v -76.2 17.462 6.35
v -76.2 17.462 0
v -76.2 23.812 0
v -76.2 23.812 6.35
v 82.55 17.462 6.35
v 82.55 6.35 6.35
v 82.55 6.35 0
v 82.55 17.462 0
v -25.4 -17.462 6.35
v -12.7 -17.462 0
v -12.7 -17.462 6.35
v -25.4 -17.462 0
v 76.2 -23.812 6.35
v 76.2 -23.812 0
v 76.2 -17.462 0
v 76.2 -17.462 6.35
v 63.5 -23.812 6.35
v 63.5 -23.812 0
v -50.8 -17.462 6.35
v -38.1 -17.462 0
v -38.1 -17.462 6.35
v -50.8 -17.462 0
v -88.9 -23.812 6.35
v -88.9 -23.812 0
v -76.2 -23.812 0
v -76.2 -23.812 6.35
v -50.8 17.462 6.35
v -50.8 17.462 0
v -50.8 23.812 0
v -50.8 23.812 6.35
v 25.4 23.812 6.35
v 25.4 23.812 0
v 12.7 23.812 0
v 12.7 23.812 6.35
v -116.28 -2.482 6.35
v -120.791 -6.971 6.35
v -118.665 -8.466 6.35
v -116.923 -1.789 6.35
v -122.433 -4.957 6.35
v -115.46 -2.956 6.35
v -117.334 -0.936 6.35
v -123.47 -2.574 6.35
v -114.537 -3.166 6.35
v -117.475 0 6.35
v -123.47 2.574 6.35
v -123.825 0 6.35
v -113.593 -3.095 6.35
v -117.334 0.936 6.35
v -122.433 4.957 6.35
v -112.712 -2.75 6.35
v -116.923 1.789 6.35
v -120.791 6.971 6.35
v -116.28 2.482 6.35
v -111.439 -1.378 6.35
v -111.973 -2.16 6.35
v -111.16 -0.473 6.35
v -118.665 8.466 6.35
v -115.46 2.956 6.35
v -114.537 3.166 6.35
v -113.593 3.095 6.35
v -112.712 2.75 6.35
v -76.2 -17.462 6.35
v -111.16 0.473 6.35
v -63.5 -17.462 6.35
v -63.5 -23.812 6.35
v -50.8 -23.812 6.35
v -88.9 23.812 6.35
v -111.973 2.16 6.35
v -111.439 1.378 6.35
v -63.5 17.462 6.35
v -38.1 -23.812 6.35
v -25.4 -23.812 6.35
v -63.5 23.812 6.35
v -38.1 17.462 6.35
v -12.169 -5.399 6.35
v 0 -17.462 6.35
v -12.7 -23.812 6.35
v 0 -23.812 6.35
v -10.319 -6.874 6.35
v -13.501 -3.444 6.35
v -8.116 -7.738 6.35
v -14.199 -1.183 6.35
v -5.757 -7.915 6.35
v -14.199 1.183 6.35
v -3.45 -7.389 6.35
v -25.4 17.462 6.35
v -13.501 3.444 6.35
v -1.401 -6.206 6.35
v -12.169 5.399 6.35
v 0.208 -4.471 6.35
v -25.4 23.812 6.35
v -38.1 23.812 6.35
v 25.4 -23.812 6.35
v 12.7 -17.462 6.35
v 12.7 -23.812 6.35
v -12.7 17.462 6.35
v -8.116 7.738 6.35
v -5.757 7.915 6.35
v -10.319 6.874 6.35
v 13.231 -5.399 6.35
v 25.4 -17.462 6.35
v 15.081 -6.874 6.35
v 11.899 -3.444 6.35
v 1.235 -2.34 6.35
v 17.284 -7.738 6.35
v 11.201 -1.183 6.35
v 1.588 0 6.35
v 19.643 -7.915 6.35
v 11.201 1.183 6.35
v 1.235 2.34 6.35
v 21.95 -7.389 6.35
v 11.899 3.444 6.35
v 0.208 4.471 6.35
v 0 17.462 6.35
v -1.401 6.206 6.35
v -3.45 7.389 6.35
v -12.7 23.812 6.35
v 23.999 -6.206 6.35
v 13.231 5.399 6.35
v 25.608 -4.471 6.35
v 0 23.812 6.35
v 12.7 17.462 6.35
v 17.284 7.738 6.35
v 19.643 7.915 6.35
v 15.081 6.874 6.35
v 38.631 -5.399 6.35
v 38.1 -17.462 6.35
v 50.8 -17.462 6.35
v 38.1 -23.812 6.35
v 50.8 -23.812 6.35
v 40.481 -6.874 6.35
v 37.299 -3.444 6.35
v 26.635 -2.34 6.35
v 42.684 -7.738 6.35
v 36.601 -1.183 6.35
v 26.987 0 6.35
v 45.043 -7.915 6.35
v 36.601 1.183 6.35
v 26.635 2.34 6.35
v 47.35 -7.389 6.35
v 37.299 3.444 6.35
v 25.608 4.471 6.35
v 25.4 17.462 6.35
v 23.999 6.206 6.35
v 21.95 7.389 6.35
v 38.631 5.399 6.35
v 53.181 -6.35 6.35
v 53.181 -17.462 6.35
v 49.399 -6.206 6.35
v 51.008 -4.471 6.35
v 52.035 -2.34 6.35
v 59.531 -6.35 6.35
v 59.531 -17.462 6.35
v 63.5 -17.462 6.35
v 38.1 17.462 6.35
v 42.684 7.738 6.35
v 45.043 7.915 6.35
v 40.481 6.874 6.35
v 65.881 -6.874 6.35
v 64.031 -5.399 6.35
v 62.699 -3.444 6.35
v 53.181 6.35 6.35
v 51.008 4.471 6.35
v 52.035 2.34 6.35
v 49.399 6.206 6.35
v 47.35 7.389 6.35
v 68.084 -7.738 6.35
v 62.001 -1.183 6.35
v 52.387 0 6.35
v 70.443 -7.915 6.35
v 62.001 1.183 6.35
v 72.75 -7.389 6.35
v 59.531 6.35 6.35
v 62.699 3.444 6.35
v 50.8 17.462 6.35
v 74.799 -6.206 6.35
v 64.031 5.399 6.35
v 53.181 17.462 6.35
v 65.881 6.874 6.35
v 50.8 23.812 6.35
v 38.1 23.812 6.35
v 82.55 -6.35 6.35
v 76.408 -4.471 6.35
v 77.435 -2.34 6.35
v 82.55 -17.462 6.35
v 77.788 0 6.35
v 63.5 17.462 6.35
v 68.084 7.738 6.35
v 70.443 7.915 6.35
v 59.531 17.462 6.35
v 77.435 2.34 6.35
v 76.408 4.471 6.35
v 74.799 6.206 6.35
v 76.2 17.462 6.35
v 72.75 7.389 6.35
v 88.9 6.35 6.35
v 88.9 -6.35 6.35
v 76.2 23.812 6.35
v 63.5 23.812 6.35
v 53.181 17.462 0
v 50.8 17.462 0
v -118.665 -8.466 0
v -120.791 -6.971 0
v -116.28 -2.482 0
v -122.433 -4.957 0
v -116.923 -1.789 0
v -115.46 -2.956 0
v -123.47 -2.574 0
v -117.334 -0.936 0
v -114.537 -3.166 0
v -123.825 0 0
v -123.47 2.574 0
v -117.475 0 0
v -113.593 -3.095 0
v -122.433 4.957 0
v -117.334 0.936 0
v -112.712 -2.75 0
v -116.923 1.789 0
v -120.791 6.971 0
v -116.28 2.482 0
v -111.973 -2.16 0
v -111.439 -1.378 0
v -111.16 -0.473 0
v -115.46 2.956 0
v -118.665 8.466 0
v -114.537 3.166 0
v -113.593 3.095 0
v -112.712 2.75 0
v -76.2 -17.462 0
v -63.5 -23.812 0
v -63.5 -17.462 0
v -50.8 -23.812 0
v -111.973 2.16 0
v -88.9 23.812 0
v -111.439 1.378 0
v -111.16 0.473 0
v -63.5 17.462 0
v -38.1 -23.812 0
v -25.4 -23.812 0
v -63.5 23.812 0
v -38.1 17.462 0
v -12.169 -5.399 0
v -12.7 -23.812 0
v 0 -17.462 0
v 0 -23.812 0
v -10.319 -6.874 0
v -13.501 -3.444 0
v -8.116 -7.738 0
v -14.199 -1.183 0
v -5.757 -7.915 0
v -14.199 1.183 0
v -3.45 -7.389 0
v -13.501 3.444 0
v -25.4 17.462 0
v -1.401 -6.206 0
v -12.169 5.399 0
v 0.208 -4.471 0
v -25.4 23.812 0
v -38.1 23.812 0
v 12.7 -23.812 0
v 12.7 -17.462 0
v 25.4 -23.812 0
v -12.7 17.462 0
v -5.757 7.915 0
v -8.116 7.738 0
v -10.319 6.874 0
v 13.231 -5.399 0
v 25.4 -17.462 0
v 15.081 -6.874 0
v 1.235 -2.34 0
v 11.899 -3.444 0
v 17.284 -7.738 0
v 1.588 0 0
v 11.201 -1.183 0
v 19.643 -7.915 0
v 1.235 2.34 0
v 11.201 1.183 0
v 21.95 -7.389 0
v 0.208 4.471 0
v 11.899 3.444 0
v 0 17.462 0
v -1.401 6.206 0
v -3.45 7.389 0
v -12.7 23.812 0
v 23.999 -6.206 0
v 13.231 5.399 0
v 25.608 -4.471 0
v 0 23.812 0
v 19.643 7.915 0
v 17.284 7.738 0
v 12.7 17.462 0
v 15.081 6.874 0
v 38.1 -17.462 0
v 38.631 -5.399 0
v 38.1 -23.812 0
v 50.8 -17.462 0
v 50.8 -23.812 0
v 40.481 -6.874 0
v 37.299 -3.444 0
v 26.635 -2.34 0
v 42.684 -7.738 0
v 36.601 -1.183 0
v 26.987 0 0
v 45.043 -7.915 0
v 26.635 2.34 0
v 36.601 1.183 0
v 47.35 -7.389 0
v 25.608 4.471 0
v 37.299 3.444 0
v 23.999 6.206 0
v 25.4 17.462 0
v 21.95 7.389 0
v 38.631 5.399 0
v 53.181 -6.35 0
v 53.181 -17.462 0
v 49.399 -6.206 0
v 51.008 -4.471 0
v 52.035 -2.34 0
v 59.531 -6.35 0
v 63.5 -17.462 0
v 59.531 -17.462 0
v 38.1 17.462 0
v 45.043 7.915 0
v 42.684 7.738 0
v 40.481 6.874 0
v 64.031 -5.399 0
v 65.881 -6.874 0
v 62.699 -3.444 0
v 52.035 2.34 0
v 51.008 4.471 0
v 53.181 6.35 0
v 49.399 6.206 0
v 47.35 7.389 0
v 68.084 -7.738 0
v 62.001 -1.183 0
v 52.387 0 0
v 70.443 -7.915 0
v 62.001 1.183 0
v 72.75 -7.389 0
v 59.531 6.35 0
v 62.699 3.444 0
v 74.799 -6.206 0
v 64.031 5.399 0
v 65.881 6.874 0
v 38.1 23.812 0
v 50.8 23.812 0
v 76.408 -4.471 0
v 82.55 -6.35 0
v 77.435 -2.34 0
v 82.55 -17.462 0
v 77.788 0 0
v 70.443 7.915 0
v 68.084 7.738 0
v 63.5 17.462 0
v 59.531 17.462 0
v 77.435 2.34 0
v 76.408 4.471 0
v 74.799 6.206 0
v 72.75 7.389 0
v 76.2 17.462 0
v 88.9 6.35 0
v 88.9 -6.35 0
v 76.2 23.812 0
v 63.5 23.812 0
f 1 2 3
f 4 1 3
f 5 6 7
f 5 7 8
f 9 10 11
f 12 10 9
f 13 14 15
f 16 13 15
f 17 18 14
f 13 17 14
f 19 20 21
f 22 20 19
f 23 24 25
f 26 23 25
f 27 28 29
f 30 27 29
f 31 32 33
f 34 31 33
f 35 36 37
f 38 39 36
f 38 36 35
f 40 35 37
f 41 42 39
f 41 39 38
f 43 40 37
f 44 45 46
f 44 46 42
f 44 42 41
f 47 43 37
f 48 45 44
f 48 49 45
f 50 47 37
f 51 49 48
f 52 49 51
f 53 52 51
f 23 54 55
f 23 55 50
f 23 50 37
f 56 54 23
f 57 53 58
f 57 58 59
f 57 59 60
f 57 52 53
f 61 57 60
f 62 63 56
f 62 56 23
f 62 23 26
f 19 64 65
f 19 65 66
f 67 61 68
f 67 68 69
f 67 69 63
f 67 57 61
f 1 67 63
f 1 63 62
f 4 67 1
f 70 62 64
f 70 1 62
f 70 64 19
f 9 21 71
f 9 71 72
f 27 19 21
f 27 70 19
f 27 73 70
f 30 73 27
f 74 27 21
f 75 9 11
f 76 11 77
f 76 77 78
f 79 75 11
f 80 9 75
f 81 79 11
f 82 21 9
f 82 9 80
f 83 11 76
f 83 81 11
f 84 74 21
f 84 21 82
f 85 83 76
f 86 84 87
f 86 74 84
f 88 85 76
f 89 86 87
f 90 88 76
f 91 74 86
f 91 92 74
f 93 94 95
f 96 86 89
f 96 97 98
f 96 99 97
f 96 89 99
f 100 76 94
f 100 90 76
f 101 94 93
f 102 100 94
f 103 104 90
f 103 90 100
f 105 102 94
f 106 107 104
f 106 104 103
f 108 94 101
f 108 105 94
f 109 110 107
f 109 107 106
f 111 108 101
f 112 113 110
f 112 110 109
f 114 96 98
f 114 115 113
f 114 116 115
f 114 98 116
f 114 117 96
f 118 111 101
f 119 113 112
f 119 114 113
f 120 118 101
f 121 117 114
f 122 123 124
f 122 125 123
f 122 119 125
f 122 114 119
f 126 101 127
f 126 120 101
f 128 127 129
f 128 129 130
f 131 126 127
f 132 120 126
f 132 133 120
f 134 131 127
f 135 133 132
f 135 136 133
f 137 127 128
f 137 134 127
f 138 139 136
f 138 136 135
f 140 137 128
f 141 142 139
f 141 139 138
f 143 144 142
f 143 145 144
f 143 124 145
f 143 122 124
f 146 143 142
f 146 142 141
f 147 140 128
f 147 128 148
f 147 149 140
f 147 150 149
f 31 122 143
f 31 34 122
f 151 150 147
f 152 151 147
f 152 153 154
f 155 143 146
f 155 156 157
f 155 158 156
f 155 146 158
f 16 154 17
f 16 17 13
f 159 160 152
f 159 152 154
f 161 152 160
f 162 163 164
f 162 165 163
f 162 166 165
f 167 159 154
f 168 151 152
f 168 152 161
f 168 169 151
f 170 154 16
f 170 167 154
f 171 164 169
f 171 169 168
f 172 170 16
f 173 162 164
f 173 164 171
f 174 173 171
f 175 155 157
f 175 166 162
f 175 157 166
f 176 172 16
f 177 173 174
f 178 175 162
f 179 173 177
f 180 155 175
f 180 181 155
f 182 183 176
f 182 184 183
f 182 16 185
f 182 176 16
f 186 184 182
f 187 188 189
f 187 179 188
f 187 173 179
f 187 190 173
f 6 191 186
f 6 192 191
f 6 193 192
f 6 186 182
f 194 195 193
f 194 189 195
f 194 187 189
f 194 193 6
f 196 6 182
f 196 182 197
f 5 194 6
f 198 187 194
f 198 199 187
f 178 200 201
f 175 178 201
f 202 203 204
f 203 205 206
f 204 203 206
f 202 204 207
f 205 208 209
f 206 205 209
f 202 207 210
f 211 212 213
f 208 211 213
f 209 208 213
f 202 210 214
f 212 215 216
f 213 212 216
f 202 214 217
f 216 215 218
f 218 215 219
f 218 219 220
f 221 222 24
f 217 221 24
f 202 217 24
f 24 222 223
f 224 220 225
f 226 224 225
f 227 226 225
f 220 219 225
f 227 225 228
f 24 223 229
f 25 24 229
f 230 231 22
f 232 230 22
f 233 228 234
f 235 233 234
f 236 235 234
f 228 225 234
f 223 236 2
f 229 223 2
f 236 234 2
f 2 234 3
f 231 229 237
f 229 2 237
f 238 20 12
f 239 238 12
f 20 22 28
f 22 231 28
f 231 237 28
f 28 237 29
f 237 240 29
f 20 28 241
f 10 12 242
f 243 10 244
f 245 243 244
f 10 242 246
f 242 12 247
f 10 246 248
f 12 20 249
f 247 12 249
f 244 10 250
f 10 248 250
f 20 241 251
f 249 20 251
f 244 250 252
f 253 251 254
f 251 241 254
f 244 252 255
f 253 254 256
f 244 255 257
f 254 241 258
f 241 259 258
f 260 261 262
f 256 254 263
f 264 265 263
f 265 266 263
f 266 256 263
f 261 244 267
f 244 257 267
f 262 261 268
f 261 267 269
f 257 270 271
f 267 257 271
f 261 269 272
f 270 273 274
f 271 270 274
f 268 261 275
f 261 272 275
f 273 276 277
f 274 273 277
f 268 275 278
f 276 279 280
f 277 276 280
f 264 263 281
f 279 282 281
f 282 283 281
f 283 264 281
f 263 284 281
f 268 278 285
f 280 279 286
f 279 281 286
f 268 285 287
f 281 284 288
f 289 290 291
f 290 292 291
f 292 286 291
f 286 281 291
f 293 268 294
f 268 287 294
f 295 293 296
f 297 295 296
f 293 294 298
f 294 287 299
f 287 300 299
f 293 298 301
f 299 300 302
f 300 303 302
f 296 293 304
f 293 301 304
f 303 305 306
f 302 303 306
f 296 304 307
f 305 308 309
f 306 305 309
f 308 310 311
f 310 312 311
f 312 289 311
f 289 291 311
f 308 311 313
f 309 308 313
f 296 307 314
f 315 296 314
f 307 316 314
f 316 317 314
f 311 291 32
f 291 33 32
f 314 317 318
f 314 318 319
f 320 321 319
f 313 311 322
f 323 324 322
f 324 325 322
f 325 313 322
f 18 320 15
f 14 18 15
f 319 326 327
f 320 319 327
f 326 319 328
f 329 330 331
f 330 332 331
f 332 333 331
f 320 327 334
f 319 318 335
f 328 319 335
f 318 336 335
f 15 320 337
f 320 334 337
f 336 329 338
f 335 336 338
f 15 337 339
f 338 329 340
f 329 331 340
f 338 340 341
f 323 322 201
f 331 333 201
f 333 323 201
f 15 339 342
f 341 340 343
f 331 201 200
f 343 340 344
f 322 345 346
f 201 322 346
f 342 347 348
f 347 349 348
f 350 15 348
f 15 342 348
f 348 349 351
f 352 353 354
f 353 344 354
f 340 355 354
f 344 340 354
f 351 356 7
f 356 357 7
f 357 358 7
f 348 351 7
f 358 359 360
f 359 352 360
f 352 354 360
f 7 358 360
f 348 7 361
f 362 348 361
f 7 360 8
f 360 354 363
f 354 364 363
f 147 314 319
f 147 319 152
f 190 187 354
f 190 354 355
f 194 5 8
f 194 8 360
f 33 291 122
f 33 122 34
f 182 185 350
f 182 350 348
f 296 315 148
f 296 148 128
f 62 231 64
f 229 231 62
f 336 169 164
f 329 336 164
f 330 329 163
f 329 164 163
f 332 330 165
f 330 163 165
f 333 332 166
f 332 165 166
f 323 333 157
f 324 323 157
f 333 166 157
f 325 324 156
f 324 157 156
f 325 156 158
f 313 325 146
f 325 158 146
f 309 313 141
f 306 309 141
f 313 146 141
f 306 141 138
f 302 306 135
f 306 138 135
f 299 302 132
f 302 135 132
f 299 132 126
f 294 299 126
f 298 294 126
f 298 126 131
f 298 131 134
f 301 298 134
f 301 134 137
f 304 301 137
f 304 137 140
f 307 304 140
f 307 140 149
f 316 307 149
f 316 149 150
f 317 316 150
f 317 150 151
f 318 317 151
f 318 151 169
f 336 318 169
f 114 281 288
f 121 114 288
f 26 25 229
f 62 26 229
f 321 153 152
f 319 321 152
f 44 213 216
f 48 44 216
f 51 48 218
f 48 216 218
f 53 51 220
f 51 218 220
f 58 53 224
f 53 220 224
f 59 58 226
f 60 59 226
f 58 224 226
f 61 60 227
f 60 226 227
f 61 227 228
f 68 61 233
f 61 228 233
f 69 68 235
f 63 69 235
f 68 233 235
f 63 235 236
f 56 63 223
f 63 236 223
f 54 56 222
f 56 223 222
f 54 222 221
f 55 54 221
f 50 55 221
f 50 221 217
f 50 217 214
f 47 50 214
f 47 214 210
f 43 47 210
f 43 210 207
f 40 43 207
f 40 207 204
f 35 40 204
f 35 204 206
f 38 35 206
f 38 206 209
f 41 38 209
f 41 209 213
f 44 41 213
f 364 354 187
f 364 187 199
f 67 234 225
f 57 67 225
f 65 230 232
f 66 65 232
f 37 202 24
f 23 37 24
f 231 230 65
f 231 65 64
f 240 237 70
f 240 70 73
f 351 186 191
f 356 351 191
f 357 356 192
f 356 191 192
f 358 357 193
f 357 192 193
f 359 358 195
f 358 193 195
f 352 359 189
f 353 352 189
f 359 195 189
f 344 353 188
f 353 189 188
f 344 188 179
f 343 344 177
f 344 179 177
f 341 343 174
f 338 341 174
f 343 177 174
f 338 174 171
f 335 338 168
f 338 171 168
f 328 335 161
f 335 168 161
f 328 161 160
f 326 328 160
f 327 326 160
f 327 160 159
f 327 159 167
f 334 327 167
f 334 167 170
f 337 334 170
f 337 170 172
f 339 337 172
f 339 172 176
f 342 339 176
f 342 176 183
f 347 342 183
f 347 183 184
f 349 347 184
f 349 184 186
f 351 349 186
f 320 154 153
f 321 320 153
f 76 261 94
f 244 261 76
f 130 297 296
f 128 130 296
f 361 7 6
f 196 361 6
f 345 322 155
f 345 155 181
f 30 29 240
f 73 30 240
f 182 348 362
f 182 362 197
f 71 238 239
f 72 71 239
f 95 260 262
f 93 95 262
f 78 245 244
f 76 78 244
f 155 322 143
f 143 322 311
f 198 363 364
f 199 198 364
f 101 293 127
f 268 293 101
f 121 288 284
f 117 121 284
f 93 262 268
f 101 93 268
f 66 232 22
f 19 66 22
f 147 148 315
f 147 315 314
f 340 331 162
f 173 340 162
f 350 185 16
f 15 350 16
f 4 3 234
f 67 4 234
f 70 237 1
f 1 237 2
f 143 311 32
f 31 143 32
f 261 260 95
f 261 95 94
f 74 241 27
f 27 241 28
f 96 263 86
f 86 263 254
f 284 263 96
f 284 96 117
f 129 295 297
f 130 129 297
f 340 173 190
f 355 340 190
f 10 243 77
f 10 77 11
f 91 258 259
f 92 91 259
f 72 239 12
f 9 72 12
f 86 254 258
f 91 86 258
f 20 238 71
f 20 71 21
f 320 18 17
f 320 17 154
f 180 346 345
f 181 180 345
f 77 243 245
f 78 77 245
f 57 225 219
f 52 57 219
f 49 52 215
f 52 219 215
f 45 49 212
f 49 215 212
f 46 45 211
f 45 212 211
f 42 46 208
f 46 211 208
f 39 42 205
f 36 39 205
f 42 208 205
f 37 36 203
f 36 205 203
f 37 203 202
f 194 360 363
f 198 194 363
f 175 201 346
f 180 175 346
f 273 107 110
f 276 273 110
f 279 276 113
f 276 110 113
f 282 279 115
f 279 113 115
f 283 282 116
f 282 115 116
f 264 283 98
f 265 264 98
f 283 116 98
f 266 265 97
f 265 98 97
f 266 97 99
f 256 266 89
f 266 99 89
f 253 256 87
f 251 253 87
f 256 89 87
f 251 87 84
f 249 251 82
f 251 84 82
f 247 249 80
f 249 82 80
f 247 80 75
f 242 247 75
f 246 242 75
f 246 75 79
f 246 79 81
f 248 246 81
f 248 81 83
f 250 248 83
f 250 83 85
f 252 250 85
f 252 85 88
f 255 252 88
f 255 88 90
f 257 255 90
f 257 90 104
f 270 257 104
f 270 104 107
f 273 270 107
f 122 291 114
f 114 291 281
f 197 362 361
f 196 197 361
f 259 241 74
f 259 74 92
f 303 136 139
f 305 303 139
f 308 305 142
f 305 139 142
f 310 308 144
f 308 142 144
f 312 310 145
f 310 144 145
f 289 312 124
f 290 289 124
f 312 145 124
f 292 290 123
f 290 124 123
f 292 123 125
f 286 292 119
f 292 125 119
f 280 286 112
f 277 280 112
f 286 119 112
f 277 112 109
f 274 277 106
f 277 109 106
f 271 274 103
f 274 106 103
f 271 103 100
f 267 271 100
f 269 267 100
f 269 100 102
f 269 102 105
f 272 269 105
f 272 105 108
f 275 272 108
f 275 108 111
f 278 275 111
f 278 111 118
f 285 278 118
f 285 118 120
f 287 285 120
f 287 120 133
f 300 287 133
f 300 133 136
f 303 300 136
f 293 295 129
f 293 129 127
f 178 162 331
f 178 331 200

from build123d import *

# Parameters (mm, degrees)
MASS_DEPTH          = 6.35
SKETCH4_R           = 3.175
CUT_EXTRUDE1_DEPTH  = 127.253666407
SKETCH3_W           = 12.7
SKETCH3_H           = 12.7
CUT_EXTRUDE2_DEPTH  = 127.253666407
LPATTERN1_COUNT     = 7
LPATTERN1_PITCH     = 25.4
SKETCH5_R           = 7.9375
CUT_EXTRUDE3_DEPTH  = 127.253666407
LPATTERN2_COUNT     = 4
LPATTERN2_PITCH     = 25.4
CAVITY1_START       = 53.18125
CAVITY1_OUTLINE_W   = 11.1125
CAVITY1_OUTLINE_H   = 6.35
CAVITY1_DEPTH       = 6.35
CAVITY1_START_2     = 82.55
CAVITY1_2_OUTLINE_W = 11.1125
CAVITY1_2_OUTLINE_H = 6.35
CAVITY1_2_DEPTH     = 6.35


# Read off the part's stored shape, not the designer's step: Cavity1
with BuildPart() as part:
    # Sketch1 → Mass (new body)
    with BuildSketch(Plane.XY):
        with BuildLine():
            Line((-88.9, -23.8125), (88.9, -23.8125))
            Line((88.9, -23.8125), (88.9, 23.8125))
            Line((88.9, 23.8125), (-88.9, 23.8125))
            Line((-88.9, 23.8125), (-118.664971781, 8.4659699))
            ThreePointArc((-118.664971781, 8.4659699), (-123.825, 0), (-118.664971781, -8.4659699))
            Line((-118.664971781, -8.4659699), (-88.9, -23.8125))
        make_face()
    extrude(amount=MASS_DEPTH)

    # Sketch4 → Cut-Extrude1 (cut, through all)
    with BuildSketch(Plane(origin=(0, 0, 0), x_dir=(-1, 0, 0), z_dir=(0, 0, -1))):
        with Locations((114.3, 0)):
            Circle(SKETCH4_R)
    extrude(amount=-CUT_EXTRUDE1_DEPTH, mode=Mode.SUBTRACT)

    # Sketch3 → Cut-Extrude2 (cut, through all)
    with BuildSketch(Plane(origin=(0, 0, 0), x_dir=(-1, 0, 0), z_dir=(0, 0, -1))):
        with Locations((-82.55, 23.8125)):
            Rectangle(SKETCH3_W, SKETCH3_H)
        with Locations((-82.55, -23.8125)):
            Rectangle(SKETCH3_W, SKETCH3_H)
    cut_extrude2 = extrude(amount=-CUT_EXTRUDE2_DEPTH, mode=Mode.SUBTRACT)

    # LPattern1: Cut-Extrude2 ×7
    with Locations(*[(-i * LPATTERN1_PITCH, 0, 0) for i in range(1, LPATTERN1_COUNT)]):
        add(cut_extrude2, mode=Mode.SUBTRACT)

    # Sketch5 → Cut-Extrude3 (cut, through all)
    with BuildSketch(Plane.XY.offset(6.35)):
        with Locations((69.85, 0)):
            Circle(SKETCH5_R)
    cut_extrude3 = extrude(amount=-CUT_EXTRUDE3_DEPTH, mode=Mode.SUBTRACT)

    # LPattern2: Cut-Extrude3 ×4
    with Locations(*[(-i * LPATTERN2_PITCH, 0, 0) for i in range(1, LPATTERN2_COUNT)]):
        add(cut_extrude3, mode=Mode.SUBTRACT)

    # Cavity1 outline → Cavity1 (cut)
    with BuildSketch(Plane.YZ.offset(CAVITY1_START)):
        with Locations((-11.90625, 3.175)):
            Rectangle(CAVITY1_OUTLINE_W, CAVITY1_OUTLINE_H)
        with Locations((11.90625, 3.175)):
            Rectangle(CAVITY1_OUTLINE_W, CAVITY1_OUTLINE_H)
    extrude(amount=CAVITY1_DEPTH, mode=Mode.SUBTRACT)

    # Cavity1 2 outline → Cavity1 2 (cut)
    with BuildSketch(Plane.YZ.offset(CAVITY1_START_2)):
        with Locations((-11.90625, 3.175)):
            Rectangle(CAVITY1_2_OUTLINE_W, CAVITY1_2_OUTLINE_H)
        with Locations((11.90625, 3.175)):
            Rectangle(CAVITY1_2_OUTLINE_W, CAVITY1_2_OUTLINE_H)
    extrude(amount=CAVITY1_2_DEPTH, mode=Mode.SUBTRACT)


solid = part.part
